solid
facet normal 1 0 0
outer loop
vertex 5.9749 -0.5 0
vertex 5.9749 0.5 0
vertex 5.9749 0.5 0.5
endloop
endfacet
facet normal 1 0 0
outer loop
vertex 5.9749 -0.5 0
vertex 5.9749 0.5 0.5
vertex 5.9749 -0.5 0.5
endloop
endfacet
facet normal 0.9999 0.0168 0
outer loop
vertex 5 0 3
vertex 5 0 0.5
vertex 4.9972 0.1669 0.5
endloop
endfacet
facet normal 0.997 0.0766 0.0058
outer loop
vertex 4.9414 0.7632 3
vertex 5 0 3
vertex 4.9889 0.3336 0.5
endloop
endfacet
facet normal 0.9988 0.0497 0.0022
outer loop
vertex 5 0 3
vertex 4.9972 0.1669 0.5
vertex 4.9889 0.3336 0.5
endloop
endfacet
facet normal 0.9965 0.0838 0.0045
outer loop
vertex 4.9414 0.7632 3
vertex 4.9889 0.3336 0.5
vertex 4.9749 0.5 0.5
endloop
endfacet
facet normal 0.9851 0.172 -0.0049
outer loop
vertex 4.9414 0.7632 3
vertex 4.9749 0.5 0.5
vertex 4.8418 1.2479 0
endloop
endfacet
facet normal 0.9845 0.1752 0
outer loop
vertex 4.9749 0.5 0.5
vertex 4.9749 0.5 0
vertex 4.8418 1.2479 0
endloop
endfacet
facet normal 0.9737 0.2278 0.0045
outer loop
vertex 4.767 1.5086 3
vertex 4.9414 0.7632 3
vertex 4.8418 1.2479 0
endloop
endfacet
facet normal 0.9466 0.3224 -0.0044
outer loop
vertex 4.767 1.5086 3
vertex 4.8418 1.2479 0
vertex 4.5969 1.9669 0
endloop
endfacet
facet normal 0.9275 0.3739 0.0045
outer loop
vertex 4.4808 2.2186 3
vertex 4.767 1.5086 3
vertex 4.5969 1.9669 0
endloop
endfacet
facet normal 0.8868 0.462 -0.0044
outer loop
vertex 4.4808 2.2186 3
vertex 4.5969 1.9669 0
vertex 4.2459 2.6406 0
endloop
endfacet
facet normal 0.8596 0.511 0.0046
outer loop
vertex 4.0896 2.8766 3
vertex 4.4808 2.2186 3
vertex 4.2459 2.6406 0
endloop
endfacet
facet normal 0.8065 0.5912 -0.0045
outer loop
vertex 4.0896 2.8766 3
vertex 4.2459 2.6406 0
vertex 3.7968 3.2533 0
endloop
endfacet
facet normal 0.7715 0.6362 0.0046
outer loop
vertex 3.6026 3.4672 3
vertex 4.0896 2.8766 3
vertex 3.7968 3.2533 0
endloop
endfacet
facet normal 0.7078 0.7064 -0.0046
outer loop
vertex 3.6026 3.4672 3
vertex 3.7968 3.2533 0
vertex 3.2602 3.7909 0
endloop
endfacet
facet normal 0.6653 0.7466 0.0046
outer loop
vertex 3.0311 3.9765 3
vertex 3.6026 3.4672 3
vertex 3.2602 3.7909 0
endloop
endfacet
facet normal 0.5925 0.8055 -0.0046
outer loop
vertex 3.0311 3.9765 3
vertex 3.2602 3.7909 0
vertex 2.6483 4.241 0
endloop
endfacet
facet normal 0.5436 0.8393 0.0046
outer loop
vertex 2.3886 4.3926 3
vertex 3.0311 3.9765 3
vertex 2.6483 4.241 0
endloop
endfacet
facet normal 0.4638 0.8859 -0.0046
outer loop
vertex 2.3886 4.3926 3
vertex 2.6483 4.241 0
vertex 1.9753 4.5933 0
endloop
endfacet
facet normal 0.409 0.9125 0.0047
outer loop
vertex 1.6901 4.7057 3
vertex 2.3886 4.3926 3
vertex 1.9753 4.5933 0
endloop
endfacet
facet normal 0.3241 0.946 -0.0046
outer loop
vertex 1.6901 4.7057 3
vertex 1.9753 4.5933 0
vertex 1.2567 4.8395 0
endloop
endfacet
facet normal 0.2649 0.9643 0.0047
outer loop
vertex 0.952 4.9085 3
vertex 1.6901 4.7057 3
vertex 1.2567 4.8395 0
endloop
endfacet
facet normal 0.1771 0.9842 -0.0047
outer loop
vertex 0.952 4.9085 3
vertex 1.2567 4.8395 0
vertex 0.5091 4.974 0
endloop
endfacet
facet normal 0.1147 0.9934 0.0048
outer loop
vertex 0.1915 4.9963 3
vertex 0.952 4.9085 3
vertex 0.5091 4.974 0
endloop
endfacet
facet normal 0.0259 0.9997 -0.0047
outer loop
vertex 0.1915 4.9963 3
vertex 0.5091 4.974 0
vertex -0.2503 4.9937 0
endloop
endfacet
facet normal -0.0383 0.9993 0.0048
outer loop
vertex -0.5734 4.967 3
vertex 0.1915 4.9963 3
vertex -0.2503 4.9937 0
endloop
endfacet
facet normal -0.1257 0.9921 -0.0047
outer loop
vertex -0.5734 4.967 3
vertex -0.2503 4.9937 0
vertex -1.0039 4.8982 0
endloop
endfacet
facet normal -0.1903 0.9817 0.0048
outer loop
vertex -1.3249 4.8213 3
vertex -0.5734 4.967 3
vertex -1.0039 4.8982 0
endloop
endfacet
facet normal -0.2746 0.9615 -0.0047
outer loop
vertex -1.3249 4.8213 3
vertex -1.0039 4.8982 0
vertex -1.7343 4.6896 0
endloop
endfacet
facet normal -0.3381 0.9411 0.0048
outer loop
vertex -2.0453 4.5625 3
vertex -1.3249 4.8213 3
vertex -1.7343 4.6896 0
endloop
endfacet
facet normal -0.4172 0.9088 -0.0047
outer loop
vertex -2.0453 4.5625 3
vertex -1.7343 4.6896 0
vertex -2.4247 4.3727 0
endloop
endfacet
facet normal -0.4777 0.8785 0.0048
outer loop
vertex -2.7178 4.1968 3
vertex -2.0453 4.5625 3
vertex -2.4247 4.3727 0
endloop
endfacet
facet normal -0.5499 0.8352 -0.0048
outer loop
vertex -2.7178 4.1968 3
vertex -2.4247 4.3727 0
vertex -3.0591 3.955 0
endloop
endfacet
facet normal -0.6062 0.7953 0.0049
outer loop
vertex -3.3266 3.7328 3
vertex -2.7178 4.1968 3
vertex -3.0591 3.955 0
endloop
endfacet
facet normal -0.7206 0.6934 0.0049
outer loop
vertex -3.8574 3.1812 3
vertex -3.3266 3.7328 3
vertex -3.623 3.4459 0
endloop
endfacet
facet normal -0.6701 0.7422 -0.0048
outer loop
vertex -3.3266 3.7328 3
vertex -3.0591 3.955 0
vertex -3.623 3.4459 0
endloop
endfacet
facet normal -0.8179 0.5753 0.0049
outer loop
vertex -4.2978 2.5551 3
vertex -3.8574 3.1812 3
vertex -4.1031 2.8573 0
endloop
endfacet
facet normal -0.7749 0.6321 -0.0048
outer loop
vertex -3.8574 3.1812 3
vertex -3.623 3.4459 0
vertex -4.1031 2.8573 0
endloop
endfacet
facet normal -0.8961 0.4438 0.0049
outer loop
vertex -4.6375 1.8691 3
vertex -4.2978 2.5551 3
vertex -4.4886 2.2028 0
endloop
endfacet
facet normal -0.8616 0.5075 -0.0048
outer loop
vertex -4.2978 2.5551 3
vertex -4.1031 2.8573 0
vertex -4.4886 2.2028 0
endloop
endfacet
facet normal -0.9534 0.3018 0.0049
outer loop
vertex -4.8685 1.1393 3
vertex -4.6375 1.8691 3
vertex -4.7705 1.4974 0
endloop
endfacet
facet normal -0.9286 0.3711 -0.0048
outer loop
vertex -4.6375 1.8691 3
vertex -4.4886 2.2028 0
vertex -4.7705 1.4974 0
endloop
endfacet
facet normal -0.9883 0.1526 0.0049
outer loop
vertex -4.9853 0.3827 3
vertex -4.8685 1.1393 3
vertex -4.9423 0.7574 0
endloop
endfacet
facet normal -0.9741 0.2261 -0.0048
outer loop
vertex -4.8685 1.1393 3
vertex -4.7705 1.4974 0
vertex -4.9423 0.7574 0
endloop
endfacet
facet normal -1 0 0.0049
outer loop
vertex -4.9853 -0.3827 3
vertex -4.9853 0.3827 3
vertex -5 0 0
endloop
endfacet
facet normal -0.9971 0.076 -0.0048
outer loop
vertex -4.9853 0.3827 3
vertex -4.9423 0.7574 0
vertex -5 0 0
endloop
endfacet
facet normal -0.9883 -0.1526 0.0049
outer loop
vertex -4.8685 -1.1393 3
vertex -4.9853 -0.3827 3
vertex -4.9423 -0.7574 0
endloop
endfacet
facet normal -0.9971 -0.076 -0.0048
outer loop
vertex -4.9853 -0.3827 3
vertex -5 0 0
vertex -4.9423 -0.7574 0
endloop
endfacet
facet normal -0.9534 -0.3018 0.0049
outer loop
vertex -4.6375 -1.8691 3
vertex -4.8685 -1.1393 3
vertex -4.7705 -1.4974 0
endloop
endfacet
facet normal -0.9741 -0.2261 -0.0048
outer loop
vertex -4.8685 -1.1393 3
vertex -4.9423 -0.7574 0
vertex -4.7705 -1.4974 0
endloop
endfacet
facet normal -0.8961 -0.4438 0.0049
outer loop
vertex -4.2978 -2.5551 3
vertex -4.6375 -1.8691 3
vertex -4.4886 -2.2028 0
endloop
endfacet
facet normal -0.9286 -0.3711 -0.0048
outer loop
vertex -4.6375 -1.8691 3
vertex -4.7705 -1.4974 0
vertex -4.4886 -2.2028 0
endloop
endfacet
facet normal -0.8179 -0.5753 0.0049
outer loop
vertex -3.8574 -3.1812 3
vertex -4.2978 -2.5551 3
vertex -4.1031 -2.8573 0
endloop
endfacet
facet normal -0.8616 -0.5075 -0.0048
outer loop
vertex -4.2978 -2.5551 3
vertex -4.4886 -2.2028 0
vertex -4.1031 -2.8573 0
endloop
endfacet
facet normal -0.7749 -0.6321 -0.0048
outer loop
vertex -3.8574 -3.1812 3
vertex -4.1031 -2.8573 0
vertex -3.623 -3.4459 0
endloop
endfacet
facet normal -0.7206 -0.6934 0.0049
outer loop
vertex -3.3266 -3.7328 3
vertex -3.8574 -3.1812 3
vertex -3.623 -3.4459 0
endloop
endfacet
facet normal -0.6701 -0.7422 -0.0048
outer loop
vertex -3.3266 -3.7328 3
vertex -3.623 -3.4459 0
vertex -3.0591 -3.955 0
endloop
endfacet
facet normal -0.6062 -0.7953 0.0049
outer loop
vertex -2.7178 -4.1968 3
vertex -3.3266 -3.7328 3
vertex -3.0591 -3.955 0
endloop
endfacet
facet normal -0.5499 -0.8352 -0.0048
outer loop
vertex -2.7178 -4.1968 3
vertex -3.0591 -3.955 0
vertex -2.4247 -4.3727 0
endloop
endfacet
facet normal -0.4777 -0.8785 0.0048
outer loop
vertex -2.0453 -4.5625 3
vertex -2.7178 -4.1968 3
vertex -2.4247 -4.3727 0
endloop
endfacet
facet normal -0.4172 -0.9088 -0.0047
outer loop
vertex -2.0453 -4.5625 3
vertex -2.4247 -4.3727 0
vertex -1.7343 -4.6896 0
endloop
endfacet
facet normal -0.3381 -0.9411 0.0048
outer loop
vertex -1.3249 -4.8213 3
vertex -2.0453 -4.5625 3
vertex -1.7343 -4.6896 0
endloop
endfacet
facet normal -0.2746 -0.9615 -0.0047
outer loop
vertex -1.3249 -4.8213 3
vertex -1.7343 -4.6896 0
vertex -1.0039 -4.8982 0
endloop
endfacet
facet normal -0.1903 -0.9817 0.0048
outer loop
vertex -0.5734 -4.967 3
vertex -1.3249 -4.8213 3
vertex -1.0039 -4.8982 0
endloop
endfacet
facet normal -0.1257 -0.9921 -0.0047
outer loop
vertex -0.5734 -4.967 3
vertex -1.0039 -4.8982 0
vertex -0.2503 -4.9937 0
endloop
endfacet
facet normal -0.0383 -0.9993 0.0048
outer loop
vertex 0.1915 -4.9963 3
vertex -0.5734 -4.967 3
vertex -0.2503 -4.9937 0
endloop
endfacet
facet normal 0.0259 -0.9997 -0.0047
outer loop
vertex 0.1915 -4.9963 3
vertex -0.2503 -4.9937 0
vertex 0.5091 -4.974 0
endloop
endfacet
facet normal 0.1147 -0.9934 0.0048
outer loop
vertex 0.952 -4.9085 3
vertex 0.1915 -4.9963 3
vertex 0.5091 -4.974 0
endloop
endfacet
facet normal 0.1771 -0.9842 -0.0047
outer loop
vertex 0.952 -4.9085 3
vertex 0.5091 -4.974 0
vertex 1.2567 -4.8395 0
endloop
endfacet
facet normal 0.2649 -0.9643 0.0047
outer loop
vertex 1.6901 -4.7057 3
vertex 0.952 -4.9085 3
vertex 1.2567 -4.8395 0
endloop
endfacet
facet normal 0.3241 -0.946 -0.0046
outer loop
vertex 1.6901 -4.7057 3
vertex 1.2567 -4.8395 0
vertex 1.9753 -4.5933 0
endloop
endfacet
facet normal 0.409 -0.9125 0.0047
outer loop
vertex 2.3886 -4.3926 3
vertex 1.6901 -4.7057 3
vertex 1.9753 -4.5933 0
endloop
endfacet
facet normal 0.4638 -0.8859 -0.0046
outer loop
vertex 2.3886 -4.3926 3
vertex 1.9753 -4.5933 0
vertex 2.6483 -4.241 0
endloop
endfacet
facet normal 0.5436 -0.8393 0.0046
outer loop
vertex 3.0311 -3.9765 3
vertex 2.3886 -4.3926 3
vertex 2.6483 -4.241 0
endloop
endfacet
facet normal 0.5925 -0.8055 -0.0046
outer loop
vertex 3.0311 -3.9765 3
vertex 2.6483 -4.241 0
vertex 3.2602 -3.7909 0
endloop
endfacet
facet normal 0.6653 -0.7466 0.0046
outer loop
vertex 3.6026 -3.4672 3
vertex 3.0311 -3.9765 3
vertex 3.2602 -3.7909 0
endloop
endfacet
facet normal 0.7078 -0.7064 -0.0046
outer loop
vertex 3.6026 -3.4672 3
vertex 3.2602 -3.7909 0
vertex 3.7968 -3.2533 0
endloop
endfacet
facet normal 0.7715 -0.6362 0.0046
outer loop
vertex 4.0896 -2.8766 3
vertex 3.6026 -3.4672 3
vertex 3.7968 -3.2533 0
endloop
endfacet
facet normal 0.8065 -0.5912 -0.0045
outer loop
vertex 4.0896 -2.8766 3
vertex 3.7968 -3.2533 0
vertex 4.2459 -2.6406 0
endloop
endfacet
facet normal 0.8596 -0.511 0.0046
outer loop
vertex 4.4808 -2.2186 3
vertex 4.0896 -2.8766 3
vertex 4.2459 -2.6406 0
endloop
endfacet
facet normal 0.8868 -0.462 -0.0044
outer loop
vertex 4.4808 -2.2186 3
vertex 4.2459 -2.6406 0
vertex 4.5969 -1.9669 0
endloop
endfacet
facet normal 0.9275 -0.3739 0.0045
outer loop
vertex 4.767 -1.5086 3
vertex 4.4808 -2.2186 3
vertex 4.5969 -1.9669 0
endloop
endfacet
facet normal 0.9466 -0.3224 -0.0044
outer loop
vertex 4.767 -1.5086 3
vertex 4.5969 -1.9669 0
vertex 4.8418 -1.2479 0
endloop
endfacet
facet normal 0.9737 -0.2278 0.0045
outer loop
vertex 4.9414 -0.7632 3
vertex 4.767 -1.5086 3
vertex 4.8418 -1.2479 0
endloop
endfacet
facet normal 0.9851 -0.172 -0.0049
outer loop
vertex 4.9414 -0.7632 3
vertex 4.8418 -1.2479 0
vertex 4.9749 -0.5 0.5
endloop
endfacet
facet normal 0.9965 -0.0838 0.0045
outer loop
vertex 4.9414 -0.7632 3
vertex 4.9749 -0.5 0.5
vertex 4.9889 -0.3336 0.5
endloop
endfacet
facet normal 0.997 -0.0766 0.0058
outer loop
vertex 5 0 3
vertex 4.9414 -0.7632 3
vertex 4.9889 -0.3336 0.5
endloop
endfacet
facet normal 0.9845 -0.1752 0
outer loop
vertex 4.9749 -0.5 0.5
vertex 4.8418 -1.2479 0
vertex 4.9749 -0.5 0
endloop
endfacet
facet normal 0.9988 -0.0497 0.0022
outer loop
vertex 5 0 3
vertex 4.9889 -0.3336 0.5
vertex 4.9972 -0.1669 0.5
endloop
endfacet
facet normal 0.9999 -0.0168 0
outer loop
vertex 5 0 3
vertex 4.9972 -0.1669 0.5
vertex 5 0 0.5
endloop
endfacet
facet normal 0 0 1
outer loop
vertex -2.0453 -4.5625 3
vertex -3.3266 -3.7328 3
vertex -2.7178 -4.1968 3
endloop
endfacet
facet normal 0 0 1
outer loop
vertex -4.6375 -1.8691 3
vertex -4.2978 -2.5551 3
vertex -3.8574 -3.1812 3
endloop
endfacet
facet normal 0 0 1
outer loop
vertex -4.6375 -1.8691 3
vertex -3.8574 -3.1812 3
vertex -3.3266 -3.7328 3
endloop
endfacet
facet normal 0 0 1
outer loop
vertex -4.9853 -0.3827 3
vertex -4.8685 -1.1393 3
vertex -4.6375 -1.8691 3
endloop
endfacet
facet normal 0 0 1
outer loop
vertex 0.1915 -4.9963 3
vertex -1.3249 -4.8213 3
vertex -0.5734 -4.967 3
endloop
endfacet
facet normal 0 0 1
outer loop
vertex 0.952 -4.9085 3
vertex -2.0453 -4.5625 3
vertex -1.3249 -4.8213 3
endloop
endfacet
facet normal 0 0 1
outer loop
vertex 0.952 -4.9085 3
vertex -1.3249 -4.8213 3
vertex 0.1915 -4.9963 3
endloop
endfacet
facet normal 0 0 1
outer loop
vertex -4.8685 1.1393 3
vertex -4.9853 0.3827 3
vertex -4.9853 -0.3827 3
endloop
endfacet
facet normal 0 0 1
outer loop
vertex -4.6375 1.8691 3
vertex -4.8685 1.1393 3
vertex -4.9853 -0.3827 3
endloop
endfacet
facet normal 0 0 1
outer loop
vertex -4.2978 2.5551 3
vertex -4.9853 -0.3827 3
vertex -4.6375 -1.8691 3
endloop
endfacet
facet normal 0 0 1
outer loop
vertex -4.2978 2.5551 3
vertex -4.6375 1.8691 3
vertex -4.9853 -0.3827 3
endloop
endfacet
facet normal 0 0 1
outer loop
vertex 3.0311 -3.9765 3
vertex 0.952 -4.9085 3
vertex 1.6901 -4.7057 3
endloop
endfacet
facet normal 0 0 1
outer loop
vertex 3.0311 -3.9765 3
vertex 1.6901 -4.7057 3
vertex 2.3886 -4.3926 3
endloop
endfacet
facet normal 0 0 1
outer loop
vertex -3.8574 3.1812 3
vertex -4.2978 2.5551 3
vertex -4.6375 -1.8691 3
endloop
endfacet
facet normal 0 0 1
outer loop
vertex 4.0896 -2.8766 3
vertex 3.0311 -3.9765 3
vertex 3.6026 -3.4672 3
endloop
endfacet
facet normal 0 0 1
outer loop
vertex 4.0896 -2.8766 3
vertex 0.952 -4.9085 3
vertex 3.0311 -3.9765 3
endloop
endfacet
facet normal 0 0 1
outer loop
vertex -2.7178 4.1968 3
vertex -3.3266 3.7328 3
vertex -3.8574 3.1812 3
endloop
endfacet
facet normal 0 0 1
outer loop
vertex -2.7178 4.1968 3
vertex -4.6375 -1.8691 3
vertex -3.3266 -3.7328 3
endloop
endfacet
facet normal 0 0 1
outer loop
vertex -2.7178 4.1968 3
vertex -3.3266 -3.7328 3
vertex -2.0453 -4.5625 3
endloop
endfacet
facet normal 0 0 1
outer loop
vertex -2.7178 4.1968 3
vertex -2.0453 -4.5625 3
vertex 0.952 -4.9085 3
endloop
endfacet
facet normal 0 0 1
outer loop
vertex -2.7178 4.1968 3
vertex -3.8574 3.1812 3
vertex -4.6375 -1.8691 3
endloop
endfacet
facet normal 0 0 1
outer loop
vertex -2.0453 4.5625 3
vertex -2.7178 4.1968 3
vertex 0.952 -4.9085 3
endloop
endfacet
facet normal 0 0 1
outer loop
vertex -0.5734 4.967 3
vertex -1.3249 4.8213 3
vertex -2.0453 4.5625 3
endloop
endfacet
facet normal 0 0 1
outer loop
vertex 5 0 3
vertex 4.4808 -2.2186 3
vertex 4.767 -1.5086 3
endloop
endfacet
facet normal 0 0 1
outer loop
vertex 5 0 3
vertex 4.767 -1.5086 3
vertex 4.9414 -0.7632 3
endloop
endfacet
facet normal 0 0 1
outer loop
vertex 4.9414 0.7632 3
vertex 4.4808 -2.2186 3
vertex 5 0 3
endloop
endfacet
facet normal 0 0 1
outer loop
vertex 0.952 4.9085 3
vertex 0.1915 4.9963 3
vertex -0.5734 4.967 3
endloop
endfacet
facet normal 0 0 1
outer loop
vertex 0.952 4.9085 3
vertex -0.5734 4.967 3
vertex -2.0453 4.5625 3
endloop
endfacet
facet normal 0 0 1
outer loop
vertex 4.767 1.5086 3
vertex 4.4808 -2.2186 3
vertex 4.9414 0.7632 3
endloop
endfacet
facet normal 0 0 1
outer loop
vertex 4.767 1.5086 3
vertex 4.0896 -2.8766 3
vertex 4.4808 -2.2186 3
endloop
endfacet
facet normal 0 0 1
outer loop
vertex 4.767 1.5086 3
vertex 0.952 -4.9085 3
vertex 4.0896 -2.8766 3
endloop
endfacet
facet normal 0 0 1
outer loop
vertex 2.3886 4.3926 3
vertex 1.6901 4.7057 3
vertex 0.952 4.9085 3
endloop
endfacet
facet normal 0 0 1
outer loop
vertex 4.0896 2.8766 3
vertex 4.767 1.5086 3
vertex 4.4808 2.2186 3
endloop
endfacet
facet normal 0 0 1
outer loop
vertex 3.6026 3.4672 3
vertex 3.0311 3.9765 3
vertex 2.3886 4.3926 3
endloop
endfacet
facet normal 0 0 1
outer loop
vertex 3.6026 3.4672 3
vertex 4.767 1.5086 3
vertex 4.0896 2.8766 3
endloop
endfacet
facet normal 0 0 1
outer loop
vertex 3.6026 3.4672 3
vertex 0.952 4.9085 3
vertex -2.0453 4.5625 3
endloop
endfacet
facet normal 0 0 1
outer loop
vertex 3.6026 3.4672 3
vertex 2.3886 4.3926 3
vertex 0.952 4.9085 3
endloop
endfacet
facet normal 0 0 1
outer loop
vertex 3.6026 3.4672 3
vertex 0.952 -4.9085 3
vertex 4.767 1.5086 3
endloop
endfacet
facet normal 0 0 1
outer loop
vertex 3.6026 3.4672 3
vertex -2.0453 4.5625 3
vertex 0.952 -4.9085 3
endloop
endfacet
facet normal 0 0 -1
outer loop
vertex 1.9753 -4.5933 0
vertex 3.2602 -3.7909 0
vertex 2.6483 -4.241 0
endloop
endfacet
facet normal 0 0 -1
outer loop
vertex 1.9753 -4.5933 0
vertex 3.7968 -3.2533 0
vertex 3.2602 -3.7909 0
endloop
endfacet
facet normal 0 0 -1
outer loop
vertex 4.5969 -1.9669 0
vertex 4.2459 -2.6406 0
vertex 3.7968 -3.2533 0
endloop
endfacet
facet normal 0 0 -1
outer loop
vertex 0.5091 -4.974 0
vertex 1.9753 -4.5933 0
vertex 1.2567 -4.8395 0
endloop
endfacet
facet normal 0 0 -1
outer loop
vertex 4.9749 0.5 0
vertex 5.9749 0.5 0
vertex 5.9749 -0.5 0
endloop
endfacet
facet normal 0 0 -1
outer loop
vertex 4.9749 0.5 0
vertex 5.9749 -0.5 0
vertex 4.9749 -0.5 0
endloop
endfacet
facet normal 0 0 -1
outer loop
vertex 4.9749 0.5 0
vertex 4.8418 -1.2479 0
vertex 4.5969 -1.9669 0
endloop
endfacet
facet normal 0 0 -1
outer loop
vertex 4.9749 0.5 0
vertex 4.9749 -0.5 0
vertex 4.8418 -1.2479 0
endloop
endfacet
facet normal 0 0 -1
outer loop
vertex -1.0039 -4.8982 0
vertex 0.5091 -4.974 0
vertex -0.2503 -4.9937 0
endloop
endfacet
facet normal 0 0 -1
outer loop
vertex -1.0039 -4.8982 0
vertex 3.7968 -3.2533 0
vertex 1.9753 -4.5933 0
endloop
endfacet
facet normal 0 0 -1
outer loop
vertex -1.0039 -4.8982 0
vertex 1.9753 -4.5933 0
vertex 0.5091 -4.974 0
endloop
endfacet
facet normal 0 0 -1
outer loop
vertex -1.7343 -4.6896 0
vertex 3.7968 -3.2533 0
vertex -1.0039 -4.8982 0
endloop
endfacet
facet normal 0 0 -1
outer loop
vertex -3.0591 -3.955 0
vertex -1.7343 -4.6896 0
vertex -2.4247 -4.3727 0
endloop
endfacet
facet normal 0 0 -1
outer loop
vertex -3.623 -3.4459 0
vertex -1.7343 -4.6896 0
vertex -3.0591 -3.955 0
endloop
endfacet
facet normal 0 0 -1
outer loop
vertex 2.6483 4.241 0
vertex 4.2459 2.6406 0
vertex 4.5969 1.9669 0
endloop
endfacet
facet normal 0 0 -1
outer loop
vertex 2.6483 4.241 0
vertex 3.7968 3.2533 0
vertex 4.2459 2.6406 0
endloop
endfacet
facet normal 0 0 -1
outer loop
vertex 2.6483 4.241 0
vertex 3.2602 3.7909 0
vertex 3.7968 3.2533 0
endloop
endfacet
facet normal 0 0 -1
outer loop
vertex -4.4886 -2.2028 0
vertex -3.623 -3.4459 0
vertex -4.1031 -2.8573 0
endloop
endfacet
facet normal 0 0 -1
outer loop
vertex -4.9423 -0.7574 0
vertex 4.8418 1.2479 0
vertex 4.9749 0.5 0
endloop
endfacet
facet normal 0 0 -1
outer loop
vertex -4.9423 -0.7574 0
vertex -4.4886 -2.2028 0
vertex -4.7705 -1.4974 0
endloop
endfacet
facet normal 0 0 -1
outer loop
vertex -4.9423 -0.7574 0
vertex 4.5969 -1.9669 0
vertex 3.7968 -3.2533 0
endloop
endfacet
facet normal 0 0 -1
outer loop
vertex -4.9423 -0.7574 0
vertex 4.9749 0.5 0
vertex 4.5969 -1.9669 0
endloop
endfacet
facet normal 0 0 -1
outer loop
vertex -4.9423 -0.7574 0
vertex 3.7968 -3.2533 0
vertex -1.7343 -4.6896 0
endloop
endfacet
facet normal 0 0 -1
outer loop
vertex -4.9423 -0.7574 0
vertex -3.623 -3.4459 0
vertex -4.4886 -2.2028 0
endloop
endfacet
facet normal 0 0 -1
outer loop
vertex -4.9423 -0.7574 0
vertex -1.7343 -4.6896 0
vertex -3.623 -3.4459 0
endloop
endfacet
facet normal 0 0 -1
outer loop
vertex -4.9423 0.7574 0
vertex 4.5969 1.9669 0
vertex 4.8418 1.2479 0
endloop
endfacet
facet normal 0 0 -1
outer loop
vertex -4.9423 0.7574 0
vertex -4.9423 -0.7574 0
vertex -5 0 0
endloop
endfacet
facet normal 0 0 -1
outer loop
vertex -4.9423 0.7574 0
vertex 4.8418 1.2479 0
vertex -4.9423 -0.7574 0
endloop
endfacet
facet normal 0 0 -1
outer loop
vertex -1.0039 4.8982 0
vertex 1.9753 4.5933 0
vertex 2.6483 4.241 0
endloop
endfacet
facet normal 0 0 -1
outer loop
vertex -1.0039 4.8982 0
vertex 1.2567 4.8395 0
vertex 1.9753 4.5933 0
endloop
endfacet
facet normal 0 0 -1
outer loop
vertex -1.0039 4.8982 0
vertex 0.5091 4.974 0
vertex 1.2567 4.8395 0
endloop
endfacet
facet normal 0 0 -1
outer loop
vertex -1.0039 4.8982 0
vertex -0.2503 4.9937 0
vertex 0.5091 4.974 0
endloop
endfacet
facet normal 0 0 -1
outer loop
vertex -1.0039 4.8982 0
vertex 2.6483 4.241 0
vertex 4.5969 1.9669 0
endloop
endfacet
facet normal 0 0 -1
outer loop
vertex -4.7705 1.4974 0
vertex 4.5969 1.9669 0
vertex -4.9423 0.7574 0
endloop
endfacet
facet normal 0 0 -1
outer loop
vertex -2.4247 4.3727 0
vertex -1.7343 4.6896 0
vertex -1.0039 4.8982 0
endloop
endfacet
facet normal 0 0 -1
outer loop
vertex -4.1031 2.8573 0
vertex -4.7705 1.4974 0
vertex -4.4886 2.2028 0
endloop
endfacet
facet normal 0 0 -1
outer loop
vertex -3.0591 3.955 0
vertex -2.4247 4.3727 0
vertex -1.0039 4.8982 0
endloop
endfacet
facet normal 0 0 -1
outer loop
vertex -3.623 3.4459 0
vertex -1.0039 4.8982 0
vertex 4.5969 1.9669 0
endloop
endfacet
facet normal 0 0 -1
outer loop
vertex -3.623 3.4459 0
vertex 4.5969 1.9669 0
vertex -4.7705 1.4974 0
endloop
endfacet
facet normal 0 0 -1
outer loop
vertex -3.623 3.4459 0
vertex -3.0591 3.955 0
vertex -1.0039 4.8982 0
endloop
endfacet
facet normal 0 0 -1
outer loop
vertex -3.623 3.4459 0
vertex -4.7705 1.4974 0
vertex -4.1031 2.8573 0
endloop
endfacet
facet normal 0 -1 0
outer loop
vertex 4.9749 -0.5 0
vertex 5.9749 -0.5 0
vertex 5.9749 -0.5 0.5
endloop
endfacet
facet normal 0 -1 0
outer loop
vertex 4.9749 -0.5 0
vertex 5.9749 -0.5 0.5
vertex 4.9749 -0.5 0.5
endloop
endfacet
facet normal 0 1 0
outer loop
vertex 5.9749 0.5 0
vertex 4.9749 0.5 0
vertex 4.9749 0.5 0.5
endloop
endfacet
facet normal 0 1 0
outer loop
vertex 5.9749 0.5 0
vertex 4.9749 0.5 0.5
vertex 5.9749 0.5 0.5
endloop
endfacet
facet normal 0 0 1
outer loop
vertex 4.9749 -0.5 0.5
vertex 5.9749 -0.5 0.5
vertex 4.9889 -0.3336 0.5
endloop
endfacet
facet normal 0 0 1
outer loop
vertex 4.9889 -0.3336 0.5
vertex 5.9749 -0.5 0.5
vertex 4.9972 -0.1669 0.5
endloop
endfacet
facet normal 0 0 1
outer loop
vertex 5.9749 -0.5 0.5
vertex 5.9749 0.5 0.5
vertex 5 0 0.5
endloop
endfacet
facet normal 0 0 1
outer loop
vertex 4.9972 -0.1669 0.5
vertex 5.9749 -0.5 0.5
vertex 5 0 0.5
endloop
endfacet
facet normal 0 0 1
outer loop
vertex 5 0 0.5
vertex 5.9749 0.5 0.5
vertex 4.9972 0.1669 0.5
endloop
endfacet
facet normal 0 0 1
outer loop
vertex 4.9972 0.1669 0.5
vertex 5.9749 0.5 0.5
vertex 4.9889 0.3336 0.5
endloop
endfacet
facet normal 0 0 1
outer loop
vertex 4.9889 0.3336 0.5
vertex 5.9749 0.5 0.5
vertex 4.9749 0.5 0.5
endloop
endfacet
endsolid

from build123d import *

# Parameters (mm, degrees)
SKETCH_R     = 5
PAD_DEPTH    = 3
PAD001_DEPTH = 0.5


with BuildPart() as part:
    # Sketch → Pad (new body)
    with BuildSketch(Plane.XY):
        Circle(SKETCH_R)
    extrude(amount=PAD_DEPTH)

    # Sketch001 → Pad001 (join)
    with BuildSketch(Plane.XY):
        with BuildLine():
            Line((4.974937, 0.5), (5.974937, 0.5))
            Line((5.974937, 0.5), (5.974937, -0.5))
            Line((5.974937, -0.5), (4.974937, -0.5))
            ThreePointArc((4.974937, -0.5), (5, 0), (4.974937, 0.5))
        make_face()
    extrude(amount=PAD001_DEPTH)


solid = part.part
